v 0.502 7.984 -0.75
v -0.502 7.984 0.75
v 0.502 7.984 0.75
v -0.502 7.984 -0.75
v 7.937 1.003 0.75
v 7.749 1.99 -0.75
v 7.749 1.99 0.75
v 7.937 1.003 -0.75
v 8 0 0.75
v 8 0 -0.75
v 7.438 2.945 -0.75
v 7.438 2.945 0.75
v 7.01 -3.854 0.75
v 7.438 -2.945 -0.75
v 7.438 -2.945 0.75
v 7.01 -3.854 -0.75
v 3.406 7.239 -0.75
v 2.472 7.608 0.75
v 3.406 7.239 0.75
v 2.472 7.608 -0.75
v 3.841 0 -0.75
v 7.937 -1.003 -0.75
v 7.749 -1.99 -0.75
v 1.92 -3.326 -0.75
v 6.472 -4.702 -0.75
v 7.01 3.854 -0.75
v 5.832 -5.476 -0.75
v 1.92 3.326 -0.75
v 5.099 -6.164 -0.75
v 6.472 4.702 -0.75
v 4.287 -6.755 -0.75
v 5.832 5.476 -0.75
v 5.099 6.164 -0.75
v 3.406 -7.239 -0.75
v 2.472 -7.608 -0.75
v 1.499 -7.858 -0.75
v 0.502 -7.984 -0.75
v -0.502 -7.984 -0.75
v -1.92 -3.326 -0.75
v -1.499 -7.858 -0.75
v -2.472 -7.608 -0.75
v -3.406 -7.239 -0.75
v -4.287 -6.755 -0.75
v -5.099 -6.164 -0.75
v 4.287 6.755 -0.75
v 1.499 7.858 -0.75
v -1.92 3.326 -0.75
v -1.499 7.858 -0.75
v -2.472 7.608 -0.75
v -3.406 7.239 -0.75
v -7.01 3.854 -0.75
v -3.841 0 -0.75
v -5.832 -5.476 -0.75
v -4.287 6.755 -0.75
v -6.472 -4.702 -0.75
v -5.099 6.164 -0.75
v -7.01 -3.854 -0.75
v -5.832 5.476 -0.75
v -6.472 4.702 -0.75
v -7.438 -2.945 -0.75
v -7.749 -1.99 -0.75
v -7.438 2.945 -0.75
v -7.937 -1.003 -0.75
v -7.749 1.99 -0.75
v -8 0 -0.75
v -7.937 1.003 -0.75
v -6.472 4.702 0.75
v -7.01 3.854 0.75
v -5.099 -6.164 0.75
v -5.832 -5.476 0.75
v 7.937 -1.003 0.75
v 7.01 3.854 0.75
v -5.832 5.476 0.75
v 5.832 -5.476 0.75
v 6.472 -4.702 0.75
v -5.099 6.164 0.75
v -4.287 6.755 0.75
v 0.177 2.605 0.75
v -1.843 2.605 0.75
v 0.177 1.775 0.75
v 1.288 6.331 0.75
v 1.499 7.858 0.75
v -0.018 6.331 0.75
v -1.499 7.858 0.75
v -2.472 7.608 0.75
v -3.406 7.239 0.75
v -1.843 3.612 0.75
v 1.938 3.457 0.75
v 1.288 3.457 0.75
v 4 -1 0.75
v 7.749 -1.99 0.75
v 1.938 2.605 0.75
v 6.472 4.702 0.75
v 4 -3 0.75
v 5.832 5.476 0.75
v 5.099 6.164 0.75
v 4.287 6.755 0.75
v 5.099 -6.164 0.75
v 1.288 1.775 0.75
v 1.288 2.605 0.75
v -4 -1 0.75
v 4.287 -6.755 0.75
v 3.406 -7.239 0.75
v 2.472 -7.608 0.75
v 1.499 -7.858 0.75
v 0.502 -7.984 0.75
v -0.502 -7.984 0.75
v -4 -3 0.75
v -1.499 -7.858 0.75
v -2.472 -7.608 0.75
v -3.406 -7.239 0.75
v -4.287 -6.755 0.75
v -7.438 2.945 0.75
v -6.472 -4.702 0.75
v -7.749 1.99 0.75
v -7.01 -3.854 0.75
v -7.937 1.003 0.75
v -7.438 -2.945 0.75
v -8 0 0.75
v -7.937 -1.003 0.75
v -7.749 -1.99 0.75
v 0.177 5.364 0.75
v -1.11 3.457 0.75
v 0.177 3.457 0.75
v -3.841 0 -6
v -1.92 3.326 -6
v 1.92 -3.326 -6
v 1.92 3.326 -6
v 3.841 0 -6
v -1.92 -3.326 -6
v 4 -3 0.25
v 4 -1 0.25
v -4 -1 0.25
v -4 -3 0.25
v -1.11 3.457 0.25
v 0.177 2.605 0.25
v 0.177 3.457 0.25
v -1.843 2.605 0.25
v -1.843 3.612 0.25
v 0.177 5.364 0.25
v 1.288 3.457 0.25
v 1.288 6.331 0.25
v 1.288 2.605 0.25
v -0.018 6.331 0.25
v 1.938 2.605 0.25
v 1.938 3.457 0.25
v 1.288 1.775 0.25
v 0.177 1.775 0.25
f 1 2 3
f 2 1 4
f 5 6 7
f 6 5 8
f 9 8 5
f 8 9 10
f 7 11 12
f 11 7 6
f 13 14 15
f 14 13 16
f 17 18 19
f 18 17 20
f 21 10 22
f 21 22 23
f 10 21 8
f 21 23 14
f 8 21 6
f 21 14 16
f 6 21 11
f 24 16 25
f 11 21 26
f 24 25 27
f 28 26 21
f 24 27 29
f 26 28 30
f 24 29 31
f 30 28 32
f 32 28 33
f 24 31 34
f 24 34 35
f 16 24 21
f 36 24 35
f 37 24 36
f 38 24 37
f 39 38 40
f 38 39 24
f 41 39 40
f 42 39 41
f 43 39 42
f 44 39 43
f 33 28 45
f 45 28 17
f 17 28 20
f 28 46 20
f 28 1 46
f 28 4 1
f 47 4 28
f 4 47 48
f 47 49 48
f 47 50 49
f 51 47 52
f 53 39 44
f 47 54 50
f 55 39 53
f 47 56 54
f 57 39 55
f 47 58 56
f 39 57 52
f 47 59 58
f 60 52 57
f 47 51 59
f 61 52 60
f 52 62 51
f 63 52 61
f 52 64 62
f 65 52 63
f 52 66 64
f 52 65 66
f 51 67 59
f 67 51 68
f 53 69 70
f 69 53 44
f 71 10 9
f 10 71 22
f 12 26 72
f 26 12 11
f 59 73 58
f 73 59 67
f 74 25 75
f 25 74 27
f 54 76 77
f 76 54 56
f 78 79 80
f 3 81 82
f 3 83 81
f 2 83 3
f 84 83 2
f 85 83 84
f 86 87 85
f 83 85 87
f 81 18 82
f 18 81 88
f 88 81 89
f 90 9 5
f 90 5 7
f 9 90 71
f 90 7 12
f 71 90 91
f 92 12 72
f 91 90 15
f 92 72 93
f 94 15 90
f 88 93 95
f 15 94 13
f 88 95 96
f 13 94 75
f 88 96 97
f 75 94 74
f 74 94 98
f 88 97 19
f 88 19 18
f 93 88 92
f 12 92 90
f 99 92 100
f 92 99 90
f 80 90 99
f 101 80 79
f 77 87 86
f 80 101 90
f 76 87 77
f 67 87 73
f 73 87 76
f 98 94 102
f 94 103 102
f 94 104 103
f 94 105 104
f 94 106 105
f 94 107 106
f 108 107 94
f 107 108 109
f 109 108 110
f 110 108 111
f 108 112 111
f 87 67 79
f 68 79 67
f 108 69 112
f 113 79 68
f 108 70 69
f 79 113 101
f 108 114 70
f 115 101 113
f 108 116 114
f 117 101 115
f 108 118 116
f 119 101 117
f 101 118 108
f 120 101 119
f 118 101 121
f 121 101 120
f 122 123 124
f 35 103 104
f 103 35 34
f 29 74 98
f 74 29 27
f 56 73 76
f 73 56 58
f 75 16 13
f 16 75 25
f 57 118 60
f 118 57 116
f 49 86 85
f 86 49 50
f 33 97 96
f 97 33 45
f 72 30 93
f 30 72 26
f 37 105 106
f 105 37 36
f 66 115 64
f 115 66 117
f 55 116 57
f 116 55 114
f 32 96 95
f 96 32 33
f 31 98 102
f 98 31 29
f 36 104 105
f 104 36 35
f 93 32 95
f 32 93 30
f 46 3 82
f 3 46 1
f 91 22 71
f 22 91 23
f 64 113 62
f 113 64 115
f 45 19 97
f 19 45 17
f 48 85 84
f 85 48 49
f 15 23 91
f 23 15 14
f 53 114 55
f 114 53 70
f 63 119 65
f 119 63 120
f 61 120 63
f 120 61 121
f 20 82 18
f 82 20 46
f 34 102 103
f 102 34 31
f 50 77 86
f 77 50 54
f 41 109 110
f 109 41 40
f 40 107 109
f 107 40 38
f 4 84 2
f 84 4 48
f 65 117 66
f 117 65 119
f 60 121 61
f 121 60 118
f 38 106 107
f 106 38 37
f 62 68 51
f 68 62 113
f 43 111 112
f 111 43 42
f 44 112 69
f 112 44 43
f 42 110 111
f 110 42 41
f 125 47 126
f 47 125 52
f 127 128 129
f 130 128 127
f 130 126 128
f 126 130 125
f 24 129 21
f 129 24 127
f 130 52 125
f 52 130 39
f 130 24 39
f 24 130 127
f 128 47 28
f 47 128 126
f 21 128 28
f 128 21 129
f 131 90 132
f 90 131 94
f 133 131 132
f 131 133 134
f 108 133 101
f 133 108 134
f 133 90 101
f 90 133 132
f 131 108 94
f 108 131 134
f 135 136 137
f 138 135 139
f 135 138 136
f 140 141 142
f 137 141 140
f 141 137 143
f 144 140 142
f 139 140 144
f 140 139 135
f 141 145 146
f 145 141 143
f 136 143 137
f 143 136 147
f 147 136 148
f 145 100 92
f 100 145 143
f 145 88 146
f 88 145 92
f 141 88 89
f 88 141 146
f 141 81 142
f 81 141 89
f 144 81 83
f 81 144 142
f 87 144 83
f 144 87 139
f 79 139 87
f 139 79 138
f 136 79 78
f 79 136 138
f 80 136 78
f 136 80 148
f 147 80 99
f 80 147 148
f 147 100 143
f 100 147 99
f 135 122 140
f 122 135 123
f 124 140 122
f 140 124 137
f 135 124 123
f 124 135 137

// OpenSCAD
$fn = 50;


difference() {
	union() {
		translate(v = [0, 0, -0.7500000000]) {
			cylinder(h = 1.5000000000, r = 8.0000000000);
		}
		translate(v = [0, 0, -6]) {
			linear_extrude(height = 6) {
				polygon(points = [[3.8408550000, 0.0000000000], [1.9204275000, 3.3262780023], [-1.9204275000, 3.3262780023], [-3.8408550000, 0.0000000000], [-1.9204275000, -3.3262780023], [1.9204275000, -3.3262780023]]);
			}
		}
	}
	union() {
		#translate(v = [-4.0000000000, -3.0000000000, 0.2500000000]) {
			cube(size = [8, 2, 0.5000000000]);
		}
		#translate(v = [0, 4, 0.2500000000]) {
			linear_extrude(height = 0.5000000000) {
				text(font = "SegoiUI:Bold", halign = "center", size = 4.5000000000, text = "4", valign = "center");
			}
		}
	}
}
